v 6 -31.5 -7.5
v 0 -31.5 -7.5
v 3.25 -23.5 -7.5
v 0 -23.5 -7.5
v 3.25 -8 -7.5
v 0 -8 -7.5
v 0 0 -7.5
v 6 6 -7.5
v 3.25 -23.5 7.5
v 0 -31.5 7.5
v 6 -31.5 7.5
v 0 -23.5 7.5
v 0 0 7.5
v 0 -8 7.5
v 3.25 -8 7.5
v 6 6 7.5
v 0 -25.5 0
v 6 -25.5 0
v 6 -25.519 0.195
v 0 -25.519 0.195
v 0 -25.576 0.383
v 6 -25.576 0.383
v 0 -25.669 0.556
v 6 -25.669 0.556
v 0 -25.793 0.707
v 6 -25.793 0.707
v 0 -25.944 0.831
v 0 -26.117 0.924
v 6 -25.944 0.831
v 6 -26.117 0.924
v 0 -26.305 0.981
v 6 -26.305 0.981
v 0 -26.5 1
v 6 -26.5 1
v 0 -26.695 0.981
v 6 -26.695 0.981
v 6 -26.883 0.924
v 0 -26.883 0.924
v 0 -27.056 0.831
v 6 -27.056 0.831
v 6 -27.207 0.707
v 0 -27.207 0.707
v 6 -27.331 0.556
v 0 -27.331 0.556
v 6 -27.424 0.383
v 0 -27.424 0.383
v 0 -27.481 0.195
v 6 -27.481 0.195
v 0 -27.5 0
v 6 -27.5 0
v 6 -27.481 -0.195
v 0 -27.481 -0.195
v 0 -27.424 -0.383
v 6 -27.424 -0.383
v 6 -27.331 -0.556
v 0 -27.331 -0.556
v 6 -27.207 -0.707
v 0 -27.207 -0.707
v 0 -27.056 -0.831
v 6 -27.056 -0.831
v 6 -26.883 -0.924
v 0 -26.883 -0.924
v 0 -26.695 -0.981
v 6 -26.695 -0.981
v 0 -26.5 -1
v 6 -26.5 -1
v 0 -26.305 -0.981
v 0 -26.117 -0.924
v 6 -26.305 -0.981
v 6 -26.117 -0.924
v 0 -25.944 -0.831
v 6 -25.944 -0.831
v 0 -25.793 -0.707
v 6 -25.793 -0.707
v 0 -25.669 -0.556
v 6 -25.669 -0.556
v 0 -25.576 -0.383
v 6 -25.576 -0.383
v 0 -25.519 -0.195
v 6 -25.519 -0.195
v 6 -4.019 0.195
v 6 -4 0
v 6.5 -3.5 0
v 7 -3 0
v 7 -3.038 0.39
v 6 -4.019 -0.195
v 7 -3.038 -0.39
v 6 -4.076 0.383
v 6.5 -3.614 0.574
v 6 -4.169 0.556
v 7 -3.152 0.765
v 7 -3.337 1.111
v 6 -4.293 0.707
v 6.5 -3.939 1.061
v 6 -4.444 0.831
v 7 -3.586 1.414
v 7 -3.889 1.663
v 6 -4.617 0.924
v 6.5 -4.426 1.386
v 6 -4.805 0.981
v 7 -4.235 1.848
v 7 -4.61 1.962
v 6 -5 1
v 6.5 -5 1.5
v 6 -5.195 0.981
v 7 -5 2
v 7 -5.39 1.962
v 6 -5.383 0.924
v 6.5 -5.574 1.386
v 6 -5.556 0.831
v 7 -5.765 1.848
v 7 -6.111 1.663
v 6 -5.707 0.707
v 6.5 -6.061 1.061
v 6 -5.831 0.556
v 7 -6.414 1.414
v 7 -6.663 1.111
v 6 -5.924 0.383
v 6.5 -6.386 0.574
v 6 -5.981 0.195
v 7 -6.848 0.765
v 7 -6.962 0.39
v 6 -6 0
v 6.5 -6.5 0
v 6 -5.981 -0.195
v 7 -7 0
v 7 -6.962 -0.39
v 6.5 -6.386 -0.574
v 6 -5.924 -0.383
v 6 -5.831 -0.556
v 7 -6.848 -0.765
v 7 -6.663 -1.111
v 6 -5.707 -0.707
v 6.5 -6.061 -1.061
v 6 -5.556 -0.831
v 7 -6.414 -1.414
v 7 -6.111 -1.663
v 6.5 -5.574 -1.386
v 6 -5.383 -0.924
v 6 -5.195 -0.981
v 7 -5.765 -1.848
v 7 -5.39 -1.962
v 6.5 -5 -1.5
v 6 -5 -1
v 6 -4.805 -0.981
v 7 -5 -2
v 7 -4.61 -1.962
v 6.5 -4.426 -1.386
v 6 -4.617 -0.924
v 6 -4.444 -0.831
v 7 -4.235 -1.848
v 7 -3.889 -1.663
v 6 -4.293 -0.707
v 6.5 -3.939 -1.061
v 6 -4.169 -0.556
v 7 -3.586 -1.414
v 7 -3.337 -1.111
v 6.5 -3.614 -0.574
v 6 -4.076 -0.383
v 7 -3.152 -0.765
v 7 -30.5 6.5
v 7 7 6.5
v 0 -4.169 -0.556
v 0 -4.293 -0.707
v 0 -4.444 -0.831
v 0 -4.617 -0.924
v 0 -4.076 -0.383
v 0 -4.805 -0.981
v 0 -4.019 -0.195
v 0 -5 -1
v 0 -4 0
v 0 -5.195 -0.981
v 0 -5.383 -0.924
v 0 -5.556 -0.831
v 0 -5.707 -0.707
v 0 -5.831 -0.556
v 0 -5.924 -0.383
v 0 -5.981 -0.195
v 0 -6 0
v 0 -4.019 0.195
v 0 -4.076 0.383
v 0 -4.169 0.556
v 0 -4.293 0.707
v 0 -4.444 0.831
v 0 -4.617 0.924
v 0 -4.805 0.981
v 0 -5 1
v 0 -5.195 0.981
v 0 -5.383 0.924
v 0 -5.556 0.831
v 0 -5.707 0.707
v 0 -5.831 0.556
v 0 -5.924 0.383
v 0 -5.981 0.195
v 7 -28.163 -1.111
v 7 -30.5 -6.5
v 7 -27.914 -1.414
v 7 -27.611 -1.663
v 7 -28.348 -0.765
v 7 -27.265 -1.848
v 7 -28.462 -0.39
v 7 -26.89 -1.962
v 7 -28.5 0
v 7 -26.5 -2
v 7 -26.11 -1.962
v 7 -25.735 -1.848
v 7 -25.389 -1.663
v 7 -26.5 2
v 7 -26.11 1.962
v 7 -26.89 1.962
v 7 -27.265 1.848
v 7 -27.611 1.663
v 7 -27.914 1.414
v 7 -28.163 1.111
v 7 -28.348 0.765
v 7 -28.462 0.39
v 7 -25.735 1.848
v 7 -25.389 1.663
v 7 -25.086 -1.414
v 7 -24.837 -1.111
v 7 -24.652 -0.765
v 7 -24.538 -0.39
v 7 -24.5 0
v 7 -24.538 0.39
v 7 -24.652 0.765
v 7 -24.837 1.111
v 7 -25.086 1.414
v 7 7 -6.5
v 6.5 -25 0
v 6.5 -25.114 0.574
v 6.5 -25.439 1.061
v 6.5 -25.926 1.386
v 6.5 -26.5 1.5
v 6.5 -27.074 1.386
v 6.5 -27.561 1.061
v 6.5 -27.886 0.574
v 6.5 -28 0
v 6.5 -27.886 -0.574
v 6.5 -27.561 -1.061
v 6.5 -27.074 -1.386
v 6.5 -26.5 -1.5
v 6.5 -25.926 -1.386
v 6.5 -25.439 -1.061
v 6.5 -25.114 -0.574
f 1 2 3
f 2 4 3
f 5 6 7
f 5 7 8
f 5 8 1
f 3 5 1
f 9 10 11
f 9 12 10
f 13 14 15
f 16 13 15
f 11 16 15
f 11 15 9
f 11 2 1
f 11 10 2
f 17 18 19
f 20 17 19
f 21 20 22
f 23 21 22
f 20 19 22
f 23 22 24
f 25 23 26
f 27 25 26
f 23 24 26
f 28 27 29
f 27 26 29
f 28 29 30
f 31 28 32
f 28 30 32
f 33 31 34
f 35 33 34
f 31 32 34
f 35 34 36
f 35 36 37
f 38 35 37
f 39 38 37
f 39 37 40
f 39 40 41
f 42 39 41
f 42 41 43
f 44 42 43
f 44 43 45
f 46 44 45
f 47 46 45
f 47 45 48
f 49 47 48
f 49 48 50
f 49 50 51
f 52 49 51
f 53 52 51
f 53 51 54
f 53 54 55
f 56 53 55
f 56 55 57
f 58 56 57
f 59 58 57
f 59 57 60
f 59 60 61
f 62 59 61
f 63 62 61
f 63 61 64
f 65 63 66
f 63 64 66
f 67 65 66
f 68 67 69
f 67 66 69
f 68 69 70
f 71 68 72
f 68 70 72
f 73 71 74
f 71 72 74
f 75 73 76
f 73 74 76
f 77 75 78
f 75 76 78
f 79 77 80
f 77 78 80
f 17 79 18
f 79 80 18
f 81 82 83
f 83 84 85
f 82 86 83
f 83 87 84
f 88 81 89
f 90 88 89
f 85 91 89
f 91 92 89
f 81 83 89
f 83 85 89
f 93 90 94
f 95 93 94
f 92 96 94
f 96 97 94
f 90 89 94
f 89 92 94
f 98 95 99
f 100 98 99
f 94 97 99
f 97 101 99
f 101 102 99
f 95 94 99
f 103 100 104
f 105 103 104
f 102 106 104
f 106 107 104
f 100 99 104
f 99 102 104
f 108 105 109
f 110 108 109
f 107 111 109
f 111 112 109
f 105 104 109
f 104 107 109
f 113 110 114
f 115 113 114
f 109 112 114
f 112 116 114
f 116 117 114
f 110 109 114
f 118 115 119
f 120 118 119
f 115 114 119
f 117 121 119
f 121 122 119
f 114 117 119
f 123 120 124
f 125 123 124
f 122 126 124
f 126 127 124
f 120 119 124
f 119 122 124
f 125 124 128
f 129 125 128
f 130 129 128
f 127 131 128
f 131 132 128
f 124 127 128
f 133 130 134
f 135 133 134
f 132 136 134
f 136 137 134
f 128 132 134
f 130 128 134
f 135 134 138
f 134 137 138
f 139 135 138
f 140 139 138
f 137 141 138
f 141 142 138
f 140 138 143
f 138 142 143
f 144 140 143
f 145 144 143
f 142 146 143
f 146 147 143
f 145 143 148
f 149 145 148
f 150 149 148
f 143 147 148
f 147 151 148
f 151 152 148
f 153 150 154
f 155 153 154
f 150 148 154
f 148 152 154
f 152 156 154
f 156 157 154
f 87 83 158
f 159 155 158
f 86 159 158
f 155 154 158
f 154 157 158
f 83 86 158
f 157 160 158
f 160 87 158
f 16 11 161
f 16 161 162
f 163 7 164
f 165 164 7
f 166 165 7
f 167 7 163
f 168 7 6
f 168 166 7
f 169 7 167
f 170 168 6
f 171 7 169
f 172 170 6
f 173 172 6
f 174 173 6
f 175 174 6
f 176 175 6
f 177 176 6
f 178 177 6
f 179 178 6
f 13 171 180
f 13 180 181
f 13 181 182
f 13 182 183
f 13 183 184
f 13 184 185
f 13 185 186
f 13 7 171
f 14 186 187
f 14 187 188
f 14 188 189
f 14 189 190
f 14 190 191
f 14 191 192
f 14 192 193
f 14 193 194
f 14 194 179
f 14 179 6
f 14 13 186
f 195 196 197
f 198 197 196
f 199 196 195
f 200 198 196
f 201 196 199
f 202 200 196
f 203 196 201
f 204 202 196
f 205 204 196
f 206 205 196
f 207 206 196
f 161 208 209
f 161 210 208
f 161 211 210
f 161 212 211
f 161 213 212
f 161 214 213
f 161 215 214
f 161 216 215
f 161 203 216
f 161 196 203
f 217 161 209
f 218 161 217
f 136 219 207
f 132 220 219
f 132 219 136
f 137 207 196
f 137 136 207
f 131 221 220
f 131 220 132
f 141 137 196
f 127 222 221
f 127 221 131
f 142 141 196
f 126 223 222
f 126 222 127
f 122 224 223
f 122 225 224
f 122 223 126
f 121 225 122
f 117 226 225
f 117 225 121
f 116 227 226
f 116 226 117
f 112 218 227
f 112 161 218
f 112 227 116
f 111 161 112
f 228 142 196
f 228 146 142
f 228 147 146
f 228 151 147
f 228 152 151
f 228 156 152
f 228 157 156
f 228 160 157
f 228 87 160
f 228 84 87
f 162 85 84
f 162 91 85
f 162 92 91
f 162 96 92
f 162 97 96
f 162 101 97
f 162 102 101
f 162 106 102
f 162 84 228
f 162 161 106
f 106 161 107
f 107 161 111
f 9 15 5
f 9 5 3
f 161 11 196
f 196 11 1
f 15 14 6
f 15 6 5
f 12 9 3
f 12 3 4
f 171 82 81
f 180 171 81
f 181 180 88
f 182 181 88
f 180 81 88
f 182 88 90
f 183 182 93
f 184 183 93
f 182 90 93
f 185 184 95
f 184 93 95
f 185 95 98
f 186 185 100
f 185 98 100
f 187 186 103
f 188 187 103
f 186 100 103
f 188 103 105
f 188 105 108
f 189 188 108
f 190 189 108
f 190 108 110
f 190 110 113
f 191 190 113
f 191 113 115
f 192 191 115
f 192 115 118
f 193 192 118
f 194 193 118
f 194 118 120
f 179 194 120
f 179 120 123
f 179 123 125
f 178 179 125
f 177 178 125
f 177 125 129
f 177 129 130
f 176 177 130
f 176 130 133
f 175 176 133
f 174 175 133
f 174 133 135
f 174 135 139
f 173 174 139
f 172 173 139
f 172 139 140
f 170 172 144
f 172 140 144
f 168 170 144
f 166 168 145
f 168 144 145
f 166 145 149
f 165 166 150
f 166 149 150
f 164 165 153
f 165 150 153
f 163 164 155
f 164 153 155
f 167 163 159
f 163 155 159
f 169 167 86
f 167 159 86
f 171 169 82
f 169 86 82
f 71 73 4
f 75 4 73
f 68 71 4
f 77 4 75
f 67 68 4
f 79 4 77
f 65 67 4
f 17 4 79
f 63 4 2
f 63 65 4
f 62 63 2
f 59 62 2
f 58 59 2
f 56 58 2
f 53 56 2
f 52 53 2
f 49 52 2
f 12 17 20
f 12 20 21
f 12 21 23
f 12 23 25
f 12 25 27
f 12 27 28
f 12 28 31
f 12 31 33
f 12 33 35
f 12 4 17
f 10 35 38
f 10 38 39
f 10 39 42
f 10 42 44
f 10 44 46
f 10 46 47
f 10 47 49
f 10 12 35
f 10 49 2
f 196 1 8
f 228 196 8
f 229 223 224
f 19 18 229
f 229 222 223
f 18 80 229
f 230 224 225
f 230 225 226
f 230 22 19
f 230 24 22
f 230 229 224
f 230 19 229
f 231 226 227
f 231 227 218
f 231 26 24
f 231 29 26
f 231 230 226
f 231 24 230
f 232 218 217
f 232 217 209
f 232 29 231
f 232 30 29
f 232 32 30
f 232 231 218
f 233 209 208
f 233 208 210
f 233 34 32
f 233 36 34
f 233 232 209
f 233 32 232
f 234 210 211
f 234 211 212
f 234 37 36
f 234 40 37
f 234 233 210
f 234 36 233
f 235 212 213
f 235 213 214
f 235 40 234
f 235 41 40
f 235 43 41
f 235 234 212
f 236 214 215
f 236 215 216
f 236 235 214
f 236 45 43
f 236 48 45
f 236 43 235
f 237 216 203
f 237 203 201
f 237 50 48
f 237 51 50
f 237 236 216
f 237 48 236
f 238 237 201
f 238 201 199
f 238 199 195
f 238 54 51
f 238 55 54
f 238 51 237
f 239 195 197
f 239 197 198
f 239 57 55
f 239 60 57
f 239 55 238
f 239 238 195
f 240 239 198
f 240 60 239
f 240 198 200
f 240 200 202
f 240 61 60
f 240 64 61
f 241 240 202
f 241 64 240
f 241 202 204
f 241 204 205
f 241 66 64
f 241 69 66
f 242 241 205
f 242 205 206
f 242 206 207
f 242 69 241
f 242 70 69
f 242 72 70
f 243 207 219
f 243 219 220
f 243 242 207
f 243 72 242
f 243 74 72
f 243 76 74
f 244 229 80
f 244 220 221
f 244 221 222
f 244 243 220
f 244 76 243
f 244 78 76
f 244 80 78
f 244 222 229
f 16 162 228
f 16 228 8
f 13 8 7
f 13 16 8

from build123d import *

# Parameters (mm, degrees)
PAD003_DEPTH    = 7.5
SKETCH005_R     = 1
POCKET001_DEPTH = 7.001
CHAMFER003_SIZE = 1
CHAMFER007_SIZE = 1


with BuildPart() as part:
    # Sketch004 → Pad003 (new body, symmetric)
    with BuildSketch(Plane.XY):
        Polygon((0, 0), (0, -8), (3.25, -8), (3.25, -23.5), (0, -23.5), (0, -31.5), (7, -31.5), (7, 7), align=None)
    extrude(amount=PAD003_DEPTH, both=True)

    # Sketch005 (on Face7 of Pad003) → Pocket001 (cut, through all)
    with BuildSketch(Plane.YZ.offset(7)):
        with Locations((-26.5, 0)):
            Circle(SKETCH005_R)
        with Locations((-5, 0)):
            Circle(SKETCH005_R)
    extrude(amount=-POCKET001_DEPTH, mode=Mode.SUBTRACT)

    # Chamfer003
    chamfer003_edges = [part.edges().sort_by_distance(p)[0] for p in [
        (7, -27.5, 0),
        (7, -6, 0),
    ]]
    chamfer(chamfer003_edges, length=CHAMFER003_SIZE)

    # Chamfer007
    chamfer007_edges = [part.edges().sort_by_distance(p)[0] for p in [
        (7, -12.25, -7.5),
        (7, -31.5, 0),
        (7, -12.25, 7.5),
    ]]
    chamfer(chamfer007_edges, length=CHAMFER007_SIZE)


solid = part.part
